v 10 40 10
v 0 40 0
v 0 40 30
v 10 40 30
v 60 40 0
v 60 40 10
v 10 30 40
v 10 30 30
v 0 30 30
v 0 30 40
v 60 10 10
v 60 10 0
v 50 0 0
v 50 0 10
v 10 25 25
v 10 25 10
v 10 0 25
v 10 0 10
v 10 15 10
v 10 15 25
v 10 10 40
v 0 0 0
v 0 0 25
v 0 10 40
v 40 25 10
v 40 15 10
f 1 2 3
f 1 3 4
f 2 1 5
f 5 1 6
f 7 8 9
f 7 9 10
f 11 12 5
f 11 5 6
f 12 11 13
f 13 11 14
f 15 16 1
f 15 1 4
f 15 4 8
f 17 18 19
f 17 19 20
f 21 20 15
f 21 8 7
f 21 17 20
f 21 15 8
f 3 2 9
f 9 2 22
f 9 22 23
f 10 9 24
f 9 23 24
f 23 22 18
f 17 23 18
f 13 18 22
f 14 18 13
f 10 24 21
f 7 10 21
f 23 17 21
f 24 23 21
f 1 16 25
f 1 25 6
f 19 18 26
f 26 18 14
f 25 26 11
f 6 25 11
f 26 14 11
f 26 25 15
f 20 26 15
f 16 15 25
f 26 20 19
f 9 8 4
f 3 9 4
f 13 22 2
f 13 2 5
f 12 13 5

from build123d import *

# Parameters (mm, degrees)
F0_W      = 60
F0_H      = 40
F1_DEPTH  = 40
F2_W      = 60
F2_H      = 40
F3_DEPTH  = 40.001
F5_DEPTH  = 10.001
F6_W      = 20
F6_H      = 20
F7_DEPTH  = 10.001
F9_DEPTH  = 10.001
F12_DEPTH = 10


with BuildPart() as f1:
    # F0 (on Front) → F1 (new body)
    with BuildSketch(Plane.XZ):
        with Locations((30, 20)):
            Rectangle(F0_W, F0_H)
    extrude(amount=-F1_DEPTH)

    # F2 (on face) → F3 (cut, through all)
    with BuildSketch(Plane.XZ):
        with Locations((40, 30)):
            Rectangle(F2_W, F2_H)
    extrude(amount=-F3_DEPTH, mode=Mode.SUBTRACT)

    # F4 (on face) → F5 (cut, through all)
    with BuildSketch(Plane.YZ.offset(10)):
        Polygon((-10, 25), (0, 25), (10, 40), (10, 50), (-10, 50), align=None)
    extrude(amount=-F5_DEPTH, mode=Mode.SUBTRACT)

    # F6 (on face) → F7 (cut, through all)
    with BuildSketch(Plane.YZ.offset(10)):
        with Locations((40, 40)):
            Rectangle(F6_W, F6_H)
    extrude(amount=-F7_DEPTH, mode=Mode.SUBTRACT)

    # F8 (on face) → F9 (cut, through all)
    with BuildSketch(Plane.XY.offset(10)):
        Polygon((60, 10), (50, 0), (50, -10), (70, -10), (70, 10), align=None)
    extrude(amount=-F9_DEPTH, mode=Mode.SUBTRACT)

    # F11 (on offset) → F12 (join)
    with BuildSketch(Plane.XZ.offset(-25)):
        Polygon((40, 10), (10, 25), (5, 25), (5, 5), (40, 5), align=None)
    extrude(amount=F12_DEPTH)


solid = f1.part
